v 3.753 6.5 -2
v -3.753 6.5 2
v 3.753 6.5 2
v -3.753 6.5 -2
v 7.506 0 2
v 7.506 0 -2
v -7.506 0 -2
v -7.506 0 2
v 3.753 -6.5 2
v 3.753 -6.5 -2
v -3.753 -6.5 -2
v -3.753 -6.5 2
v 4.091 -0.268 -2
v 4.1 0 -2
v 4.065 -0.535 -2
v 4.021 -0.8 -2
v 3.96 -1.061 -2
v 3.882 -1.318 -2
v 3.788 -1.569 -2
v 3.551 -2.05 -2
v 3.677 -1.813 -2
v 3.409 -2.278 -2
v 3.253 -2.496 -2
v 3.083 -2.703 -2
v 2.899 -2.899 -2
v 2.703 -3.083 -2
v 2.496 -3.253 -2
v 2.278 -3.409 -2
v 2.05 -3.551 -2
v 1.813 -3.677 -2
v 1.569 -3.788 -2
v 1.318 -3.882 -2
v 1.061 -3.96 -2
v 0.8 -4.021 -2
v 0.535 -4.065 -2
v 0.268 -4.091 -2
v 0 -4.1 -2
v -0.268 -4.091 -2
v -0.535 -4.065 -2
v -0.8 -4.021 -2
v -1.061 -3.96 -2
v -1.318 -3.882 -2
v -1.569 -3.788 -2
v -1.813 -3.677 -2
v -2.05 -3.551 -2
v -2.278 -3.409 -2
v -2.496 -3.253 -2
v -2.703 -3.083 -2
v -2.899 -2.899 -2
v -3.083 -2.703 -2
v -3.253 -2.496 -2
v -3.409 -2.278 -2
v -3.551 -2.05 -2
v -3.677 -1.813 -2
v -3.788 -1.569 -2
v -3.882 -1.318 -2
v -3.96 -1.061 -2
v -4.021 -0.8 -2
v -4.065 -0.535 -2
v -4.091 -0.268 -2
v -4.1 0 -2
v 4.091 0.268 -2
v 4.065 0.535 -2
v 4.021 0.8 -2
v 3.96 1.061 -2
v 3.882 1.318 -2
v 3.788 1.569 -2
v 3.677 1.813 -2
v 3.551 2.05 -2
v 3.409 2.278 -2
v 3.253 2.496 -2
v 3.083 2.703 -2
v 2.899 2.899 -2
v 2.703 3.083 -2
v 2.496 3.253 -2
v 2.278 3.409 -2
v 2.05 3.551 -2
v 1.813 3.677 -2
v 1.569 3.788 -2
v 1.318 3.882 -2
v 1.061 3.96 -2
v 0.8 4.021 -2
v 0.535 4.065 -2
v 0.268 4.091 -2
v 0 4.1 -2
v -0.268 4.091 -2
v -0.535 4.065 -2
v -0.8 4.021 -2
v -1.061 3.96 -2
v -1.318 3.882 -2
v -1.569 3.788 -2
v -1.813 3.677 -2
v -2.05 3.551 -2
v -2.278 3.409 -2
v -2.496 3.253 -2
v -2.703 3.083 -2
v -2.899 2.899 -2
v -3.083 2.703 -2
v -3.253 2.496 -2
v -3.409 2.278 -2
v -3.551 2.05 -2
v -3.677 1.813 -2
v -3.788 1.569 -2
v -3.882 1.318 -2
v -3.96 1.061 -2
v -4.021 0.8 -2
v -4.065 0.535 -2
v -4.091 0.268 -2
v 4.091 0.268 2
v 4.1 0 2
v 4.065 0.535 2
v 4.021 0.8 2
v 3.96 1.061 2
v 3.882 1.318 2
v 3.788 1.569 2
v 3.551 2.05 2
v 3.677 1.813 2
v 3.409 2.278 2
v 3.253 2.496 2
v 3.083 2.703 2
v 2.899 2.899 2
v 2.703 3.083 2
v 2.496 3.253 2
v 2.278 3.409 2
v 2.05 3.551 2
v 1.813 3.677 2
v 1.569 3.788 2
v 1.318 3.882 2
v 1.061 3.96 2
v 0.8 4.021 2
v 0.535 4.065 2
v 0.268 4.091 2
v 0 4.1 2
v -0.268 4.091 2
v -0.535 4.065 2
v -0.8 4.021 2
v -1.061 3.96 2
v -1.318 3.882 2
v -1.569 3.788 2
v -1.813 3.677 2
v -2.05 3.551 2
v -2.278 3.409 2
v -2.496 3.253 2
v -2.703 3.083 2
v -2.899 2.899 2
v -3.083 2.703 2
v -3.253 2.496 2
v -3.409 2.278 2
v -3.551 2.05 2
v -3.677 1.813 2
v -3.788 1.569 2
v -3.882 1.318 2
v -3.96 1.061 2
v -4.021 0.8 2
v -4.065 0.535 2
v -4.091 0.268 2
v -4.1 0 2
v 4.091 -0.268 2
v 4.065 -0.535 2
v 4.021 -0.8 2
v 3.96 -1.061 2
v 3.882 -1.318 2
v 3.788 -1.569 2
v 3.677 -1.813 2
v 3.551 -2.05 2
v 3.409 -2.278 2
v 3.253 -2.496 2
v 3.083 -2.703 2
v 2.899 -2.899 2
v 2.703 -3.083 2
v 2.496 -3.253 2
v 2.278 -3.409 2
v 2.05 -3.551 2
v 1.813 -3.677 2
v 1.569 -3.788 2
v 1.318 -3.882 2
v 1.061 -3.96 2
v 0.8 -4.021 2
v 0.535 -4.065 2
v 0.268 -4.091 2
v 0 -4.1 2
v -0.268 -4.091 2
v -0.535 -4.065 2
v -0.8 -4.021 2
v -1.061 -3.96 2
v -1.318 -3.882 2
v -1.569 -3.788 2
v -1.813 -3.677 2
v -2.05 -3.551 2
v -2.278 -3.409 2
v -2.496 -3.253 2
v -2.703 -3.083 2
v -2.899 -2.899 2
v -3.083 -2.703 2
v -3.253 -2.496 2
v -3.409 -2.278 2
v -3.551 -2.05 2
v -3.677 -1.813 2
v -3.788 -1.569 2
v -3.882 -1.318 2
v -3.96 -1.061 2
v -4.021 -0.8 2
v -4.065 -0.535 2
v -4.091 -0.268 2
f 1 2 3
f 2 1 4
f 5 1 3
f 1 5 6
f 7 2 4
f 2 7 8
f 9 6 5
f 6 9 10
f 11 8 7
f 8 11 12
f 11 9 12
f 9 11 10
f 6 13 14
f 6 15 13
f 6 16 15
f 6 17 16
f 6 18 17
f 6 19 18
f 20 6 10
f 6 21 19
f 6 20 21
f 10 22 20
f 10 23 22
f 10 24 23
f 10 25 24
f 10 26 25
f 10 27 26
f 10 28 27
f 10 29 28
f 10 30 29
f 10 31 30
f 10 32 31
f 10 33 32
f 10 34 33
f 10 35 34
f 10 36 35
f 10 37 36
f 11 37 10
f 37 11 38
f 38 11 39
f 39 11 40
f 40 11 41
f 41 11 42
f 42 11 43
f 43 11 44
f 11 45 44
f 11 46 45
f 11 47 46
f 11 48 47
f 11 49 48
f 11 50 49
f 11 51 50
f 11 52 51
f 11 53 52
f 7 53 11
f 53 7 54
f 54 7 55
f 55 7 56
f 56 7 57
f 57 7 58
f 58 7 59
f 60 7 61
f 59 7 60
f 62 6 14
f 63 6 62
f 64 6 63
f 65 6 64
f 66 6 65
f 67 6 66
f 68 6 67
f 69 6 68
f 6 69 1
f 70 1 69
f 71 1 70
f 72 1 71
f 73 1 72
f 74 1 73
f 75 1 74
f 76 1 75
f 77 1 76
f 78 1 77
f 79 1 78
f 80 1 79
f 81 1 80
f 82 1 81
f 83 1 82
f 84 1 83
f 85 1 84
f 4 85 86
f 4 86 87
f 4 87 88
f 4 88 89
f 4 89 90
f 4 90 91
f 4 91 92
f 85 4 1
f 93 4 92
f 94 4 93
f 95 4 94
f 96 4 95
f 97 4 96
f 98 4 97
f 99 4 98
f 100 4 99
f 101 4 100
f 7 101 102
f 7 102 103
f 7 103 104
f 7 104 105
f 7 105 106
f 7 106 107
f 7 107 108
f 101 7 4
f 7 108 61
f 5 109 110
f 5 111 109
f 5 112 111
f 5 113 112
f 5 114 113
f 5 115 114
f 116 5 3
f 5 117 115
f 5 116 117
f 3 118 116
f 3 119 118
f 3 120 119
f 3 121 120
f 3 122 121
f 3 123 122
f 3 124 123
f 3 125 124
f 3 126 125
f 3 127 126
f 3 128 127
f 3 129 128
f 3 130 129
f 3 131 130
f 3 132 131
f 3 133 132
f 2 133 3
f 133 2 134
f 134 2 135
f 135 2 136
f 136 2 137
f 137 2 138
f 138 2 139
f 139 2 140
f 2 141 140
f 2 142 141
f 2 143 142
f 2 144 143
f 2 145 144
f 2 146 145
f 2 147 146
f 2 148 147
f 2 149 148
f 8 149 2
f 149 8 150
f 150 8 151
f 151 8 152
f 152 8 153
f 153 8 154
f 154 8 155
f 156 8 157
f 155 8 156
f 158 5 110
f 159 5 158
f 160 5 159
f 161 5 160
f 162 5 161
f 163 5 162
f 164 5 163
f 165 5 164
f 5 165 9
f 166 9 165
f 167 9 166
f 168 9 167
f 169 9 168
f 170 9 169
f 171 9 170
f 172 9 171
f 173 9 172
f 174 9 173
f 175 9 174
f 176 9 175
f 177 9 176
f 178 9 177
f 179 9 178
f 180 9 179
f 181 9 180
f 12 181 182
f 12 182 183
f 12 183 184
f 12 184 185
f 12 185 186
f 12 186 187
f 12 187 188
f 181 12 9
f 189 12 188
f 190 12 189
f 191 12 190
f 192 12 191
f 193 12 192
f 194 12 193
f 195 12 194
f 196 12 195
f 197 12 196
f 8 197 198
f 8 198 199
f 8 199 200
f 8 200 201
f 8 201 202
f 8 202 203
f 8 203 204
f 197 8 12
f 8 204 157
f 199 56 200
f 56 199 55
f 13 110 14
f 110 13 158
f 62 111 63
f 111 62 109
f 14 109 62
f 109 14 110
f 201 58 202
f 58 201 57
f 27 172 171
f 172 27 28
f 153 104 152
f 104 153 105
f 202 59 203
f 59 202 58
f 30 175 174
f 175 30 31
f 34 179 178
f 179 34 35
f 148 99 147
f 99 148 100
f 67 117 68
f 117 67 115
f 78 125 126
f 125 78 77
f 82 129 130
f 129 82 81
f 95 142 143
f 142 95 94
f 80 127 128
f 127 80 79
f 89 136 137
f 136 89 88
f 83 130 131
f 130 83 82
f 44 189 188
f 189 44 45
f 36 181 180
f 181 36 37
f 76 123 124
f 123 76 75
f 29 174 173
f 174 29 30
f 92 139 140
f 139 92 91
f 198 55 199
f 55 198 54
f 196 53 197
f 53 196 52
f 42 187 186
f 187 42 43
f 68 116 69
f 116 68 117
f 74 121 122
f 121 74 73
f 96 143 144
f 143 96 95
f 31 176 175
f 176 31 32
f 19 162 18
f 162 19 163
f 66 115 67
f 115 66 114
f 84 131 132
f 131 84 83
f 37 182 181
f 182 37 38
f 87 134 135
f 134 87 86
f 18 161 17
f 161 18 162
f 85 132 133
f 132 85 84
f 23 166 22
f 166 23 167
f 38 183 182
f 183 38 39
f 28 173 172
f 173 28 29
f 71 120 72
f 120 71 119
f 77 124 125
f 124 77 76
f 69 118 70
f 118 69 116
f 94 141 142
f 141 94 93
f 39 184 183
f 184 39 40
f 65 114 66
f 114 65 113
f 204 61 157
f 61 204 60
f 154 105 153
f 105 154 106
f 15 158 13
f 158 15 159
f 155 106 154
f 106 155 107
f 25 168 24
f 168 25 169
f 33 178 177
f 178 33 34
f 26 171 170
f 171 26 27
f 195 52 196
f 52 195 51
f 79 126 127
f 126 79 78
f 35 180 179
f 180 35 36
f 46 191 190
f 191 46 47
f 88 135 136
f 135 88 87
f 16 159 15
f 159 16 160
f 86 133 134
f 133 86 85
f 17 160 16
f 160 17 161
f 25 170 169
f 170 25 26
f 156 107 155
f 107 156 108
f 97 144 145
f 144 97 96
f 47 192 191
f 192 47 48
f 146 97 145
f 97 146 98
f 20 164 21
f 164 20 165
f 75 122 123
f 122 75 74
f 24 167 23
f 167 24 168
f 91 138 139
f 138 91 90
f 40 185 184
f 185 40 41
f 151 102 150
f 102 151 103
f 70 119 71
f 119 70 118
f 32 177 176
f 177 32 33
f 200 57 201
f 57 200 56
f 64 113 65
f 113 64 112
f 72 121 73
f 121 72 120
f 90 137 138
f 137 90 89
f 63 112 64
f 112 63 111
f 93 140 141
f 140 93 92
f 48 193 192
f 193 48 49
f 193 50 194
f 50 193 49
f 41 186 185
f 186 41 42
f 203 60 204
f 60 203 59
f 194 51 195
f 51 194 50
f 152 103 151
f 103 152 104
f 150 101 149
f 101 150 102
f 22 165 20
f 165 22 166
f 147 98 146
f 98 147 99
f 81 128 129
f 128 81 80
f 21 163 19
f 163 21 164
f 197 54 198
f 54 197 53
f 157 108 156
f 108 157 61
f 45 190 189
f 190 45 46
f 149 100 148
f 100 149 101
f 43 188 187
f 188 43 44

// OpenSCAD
// Thin hex nut for M8: 13.0mm across flats, 4.0mm thick

$fn = 96;

// Target dimensions
thread_nominal_diameter_mm = 8.0;
across_flats_mm = 13.0;
thickness_mm = 4.0;

// Hole settings
tolerance_mm = 0.2;                 // added to clearance hole
hole_type_is_clearance = 1;         // 1=clearance, 0=undersized "threaded" pilot
threaded_hole_scale = 0.85;         // used when hole_type_is_clearance=0

// Robust boolean epsilon
eps_mm = 0.2;

// Derived
hole_diameter_mm = thread_nominal_diameter_mm;
hole_r =
    (hole_type_is_clearance == 1)
    ? (hole_diameter_mm + tolerance_mm) / 2
    : (thread_nominal_diameter_mm * threaded_hole_scale) / 2;

// Hex geometry: for a regular hex, across_flats = 2 * apothem
apothem = across_flats_mm / 2;
hex_R = apothem / cos(30);          // circumradius
hex_points = [ for (i = [0:5]) [ hex_R * cos(60*i), hex_R * sin(60*i) ] ];

module thin_hex_nut() {
    difference() {
        // Body
        linear_extrude(height = thickness_mm, center = true, convexity = 10)
            polygon(points = hex_points);

        // Through-hole (guaranteed to cut through)
        cylinder(r = hole_r, h = thickness_mm + 2*eps_mm, center = true);
    }
}

thin_hex_nut();
